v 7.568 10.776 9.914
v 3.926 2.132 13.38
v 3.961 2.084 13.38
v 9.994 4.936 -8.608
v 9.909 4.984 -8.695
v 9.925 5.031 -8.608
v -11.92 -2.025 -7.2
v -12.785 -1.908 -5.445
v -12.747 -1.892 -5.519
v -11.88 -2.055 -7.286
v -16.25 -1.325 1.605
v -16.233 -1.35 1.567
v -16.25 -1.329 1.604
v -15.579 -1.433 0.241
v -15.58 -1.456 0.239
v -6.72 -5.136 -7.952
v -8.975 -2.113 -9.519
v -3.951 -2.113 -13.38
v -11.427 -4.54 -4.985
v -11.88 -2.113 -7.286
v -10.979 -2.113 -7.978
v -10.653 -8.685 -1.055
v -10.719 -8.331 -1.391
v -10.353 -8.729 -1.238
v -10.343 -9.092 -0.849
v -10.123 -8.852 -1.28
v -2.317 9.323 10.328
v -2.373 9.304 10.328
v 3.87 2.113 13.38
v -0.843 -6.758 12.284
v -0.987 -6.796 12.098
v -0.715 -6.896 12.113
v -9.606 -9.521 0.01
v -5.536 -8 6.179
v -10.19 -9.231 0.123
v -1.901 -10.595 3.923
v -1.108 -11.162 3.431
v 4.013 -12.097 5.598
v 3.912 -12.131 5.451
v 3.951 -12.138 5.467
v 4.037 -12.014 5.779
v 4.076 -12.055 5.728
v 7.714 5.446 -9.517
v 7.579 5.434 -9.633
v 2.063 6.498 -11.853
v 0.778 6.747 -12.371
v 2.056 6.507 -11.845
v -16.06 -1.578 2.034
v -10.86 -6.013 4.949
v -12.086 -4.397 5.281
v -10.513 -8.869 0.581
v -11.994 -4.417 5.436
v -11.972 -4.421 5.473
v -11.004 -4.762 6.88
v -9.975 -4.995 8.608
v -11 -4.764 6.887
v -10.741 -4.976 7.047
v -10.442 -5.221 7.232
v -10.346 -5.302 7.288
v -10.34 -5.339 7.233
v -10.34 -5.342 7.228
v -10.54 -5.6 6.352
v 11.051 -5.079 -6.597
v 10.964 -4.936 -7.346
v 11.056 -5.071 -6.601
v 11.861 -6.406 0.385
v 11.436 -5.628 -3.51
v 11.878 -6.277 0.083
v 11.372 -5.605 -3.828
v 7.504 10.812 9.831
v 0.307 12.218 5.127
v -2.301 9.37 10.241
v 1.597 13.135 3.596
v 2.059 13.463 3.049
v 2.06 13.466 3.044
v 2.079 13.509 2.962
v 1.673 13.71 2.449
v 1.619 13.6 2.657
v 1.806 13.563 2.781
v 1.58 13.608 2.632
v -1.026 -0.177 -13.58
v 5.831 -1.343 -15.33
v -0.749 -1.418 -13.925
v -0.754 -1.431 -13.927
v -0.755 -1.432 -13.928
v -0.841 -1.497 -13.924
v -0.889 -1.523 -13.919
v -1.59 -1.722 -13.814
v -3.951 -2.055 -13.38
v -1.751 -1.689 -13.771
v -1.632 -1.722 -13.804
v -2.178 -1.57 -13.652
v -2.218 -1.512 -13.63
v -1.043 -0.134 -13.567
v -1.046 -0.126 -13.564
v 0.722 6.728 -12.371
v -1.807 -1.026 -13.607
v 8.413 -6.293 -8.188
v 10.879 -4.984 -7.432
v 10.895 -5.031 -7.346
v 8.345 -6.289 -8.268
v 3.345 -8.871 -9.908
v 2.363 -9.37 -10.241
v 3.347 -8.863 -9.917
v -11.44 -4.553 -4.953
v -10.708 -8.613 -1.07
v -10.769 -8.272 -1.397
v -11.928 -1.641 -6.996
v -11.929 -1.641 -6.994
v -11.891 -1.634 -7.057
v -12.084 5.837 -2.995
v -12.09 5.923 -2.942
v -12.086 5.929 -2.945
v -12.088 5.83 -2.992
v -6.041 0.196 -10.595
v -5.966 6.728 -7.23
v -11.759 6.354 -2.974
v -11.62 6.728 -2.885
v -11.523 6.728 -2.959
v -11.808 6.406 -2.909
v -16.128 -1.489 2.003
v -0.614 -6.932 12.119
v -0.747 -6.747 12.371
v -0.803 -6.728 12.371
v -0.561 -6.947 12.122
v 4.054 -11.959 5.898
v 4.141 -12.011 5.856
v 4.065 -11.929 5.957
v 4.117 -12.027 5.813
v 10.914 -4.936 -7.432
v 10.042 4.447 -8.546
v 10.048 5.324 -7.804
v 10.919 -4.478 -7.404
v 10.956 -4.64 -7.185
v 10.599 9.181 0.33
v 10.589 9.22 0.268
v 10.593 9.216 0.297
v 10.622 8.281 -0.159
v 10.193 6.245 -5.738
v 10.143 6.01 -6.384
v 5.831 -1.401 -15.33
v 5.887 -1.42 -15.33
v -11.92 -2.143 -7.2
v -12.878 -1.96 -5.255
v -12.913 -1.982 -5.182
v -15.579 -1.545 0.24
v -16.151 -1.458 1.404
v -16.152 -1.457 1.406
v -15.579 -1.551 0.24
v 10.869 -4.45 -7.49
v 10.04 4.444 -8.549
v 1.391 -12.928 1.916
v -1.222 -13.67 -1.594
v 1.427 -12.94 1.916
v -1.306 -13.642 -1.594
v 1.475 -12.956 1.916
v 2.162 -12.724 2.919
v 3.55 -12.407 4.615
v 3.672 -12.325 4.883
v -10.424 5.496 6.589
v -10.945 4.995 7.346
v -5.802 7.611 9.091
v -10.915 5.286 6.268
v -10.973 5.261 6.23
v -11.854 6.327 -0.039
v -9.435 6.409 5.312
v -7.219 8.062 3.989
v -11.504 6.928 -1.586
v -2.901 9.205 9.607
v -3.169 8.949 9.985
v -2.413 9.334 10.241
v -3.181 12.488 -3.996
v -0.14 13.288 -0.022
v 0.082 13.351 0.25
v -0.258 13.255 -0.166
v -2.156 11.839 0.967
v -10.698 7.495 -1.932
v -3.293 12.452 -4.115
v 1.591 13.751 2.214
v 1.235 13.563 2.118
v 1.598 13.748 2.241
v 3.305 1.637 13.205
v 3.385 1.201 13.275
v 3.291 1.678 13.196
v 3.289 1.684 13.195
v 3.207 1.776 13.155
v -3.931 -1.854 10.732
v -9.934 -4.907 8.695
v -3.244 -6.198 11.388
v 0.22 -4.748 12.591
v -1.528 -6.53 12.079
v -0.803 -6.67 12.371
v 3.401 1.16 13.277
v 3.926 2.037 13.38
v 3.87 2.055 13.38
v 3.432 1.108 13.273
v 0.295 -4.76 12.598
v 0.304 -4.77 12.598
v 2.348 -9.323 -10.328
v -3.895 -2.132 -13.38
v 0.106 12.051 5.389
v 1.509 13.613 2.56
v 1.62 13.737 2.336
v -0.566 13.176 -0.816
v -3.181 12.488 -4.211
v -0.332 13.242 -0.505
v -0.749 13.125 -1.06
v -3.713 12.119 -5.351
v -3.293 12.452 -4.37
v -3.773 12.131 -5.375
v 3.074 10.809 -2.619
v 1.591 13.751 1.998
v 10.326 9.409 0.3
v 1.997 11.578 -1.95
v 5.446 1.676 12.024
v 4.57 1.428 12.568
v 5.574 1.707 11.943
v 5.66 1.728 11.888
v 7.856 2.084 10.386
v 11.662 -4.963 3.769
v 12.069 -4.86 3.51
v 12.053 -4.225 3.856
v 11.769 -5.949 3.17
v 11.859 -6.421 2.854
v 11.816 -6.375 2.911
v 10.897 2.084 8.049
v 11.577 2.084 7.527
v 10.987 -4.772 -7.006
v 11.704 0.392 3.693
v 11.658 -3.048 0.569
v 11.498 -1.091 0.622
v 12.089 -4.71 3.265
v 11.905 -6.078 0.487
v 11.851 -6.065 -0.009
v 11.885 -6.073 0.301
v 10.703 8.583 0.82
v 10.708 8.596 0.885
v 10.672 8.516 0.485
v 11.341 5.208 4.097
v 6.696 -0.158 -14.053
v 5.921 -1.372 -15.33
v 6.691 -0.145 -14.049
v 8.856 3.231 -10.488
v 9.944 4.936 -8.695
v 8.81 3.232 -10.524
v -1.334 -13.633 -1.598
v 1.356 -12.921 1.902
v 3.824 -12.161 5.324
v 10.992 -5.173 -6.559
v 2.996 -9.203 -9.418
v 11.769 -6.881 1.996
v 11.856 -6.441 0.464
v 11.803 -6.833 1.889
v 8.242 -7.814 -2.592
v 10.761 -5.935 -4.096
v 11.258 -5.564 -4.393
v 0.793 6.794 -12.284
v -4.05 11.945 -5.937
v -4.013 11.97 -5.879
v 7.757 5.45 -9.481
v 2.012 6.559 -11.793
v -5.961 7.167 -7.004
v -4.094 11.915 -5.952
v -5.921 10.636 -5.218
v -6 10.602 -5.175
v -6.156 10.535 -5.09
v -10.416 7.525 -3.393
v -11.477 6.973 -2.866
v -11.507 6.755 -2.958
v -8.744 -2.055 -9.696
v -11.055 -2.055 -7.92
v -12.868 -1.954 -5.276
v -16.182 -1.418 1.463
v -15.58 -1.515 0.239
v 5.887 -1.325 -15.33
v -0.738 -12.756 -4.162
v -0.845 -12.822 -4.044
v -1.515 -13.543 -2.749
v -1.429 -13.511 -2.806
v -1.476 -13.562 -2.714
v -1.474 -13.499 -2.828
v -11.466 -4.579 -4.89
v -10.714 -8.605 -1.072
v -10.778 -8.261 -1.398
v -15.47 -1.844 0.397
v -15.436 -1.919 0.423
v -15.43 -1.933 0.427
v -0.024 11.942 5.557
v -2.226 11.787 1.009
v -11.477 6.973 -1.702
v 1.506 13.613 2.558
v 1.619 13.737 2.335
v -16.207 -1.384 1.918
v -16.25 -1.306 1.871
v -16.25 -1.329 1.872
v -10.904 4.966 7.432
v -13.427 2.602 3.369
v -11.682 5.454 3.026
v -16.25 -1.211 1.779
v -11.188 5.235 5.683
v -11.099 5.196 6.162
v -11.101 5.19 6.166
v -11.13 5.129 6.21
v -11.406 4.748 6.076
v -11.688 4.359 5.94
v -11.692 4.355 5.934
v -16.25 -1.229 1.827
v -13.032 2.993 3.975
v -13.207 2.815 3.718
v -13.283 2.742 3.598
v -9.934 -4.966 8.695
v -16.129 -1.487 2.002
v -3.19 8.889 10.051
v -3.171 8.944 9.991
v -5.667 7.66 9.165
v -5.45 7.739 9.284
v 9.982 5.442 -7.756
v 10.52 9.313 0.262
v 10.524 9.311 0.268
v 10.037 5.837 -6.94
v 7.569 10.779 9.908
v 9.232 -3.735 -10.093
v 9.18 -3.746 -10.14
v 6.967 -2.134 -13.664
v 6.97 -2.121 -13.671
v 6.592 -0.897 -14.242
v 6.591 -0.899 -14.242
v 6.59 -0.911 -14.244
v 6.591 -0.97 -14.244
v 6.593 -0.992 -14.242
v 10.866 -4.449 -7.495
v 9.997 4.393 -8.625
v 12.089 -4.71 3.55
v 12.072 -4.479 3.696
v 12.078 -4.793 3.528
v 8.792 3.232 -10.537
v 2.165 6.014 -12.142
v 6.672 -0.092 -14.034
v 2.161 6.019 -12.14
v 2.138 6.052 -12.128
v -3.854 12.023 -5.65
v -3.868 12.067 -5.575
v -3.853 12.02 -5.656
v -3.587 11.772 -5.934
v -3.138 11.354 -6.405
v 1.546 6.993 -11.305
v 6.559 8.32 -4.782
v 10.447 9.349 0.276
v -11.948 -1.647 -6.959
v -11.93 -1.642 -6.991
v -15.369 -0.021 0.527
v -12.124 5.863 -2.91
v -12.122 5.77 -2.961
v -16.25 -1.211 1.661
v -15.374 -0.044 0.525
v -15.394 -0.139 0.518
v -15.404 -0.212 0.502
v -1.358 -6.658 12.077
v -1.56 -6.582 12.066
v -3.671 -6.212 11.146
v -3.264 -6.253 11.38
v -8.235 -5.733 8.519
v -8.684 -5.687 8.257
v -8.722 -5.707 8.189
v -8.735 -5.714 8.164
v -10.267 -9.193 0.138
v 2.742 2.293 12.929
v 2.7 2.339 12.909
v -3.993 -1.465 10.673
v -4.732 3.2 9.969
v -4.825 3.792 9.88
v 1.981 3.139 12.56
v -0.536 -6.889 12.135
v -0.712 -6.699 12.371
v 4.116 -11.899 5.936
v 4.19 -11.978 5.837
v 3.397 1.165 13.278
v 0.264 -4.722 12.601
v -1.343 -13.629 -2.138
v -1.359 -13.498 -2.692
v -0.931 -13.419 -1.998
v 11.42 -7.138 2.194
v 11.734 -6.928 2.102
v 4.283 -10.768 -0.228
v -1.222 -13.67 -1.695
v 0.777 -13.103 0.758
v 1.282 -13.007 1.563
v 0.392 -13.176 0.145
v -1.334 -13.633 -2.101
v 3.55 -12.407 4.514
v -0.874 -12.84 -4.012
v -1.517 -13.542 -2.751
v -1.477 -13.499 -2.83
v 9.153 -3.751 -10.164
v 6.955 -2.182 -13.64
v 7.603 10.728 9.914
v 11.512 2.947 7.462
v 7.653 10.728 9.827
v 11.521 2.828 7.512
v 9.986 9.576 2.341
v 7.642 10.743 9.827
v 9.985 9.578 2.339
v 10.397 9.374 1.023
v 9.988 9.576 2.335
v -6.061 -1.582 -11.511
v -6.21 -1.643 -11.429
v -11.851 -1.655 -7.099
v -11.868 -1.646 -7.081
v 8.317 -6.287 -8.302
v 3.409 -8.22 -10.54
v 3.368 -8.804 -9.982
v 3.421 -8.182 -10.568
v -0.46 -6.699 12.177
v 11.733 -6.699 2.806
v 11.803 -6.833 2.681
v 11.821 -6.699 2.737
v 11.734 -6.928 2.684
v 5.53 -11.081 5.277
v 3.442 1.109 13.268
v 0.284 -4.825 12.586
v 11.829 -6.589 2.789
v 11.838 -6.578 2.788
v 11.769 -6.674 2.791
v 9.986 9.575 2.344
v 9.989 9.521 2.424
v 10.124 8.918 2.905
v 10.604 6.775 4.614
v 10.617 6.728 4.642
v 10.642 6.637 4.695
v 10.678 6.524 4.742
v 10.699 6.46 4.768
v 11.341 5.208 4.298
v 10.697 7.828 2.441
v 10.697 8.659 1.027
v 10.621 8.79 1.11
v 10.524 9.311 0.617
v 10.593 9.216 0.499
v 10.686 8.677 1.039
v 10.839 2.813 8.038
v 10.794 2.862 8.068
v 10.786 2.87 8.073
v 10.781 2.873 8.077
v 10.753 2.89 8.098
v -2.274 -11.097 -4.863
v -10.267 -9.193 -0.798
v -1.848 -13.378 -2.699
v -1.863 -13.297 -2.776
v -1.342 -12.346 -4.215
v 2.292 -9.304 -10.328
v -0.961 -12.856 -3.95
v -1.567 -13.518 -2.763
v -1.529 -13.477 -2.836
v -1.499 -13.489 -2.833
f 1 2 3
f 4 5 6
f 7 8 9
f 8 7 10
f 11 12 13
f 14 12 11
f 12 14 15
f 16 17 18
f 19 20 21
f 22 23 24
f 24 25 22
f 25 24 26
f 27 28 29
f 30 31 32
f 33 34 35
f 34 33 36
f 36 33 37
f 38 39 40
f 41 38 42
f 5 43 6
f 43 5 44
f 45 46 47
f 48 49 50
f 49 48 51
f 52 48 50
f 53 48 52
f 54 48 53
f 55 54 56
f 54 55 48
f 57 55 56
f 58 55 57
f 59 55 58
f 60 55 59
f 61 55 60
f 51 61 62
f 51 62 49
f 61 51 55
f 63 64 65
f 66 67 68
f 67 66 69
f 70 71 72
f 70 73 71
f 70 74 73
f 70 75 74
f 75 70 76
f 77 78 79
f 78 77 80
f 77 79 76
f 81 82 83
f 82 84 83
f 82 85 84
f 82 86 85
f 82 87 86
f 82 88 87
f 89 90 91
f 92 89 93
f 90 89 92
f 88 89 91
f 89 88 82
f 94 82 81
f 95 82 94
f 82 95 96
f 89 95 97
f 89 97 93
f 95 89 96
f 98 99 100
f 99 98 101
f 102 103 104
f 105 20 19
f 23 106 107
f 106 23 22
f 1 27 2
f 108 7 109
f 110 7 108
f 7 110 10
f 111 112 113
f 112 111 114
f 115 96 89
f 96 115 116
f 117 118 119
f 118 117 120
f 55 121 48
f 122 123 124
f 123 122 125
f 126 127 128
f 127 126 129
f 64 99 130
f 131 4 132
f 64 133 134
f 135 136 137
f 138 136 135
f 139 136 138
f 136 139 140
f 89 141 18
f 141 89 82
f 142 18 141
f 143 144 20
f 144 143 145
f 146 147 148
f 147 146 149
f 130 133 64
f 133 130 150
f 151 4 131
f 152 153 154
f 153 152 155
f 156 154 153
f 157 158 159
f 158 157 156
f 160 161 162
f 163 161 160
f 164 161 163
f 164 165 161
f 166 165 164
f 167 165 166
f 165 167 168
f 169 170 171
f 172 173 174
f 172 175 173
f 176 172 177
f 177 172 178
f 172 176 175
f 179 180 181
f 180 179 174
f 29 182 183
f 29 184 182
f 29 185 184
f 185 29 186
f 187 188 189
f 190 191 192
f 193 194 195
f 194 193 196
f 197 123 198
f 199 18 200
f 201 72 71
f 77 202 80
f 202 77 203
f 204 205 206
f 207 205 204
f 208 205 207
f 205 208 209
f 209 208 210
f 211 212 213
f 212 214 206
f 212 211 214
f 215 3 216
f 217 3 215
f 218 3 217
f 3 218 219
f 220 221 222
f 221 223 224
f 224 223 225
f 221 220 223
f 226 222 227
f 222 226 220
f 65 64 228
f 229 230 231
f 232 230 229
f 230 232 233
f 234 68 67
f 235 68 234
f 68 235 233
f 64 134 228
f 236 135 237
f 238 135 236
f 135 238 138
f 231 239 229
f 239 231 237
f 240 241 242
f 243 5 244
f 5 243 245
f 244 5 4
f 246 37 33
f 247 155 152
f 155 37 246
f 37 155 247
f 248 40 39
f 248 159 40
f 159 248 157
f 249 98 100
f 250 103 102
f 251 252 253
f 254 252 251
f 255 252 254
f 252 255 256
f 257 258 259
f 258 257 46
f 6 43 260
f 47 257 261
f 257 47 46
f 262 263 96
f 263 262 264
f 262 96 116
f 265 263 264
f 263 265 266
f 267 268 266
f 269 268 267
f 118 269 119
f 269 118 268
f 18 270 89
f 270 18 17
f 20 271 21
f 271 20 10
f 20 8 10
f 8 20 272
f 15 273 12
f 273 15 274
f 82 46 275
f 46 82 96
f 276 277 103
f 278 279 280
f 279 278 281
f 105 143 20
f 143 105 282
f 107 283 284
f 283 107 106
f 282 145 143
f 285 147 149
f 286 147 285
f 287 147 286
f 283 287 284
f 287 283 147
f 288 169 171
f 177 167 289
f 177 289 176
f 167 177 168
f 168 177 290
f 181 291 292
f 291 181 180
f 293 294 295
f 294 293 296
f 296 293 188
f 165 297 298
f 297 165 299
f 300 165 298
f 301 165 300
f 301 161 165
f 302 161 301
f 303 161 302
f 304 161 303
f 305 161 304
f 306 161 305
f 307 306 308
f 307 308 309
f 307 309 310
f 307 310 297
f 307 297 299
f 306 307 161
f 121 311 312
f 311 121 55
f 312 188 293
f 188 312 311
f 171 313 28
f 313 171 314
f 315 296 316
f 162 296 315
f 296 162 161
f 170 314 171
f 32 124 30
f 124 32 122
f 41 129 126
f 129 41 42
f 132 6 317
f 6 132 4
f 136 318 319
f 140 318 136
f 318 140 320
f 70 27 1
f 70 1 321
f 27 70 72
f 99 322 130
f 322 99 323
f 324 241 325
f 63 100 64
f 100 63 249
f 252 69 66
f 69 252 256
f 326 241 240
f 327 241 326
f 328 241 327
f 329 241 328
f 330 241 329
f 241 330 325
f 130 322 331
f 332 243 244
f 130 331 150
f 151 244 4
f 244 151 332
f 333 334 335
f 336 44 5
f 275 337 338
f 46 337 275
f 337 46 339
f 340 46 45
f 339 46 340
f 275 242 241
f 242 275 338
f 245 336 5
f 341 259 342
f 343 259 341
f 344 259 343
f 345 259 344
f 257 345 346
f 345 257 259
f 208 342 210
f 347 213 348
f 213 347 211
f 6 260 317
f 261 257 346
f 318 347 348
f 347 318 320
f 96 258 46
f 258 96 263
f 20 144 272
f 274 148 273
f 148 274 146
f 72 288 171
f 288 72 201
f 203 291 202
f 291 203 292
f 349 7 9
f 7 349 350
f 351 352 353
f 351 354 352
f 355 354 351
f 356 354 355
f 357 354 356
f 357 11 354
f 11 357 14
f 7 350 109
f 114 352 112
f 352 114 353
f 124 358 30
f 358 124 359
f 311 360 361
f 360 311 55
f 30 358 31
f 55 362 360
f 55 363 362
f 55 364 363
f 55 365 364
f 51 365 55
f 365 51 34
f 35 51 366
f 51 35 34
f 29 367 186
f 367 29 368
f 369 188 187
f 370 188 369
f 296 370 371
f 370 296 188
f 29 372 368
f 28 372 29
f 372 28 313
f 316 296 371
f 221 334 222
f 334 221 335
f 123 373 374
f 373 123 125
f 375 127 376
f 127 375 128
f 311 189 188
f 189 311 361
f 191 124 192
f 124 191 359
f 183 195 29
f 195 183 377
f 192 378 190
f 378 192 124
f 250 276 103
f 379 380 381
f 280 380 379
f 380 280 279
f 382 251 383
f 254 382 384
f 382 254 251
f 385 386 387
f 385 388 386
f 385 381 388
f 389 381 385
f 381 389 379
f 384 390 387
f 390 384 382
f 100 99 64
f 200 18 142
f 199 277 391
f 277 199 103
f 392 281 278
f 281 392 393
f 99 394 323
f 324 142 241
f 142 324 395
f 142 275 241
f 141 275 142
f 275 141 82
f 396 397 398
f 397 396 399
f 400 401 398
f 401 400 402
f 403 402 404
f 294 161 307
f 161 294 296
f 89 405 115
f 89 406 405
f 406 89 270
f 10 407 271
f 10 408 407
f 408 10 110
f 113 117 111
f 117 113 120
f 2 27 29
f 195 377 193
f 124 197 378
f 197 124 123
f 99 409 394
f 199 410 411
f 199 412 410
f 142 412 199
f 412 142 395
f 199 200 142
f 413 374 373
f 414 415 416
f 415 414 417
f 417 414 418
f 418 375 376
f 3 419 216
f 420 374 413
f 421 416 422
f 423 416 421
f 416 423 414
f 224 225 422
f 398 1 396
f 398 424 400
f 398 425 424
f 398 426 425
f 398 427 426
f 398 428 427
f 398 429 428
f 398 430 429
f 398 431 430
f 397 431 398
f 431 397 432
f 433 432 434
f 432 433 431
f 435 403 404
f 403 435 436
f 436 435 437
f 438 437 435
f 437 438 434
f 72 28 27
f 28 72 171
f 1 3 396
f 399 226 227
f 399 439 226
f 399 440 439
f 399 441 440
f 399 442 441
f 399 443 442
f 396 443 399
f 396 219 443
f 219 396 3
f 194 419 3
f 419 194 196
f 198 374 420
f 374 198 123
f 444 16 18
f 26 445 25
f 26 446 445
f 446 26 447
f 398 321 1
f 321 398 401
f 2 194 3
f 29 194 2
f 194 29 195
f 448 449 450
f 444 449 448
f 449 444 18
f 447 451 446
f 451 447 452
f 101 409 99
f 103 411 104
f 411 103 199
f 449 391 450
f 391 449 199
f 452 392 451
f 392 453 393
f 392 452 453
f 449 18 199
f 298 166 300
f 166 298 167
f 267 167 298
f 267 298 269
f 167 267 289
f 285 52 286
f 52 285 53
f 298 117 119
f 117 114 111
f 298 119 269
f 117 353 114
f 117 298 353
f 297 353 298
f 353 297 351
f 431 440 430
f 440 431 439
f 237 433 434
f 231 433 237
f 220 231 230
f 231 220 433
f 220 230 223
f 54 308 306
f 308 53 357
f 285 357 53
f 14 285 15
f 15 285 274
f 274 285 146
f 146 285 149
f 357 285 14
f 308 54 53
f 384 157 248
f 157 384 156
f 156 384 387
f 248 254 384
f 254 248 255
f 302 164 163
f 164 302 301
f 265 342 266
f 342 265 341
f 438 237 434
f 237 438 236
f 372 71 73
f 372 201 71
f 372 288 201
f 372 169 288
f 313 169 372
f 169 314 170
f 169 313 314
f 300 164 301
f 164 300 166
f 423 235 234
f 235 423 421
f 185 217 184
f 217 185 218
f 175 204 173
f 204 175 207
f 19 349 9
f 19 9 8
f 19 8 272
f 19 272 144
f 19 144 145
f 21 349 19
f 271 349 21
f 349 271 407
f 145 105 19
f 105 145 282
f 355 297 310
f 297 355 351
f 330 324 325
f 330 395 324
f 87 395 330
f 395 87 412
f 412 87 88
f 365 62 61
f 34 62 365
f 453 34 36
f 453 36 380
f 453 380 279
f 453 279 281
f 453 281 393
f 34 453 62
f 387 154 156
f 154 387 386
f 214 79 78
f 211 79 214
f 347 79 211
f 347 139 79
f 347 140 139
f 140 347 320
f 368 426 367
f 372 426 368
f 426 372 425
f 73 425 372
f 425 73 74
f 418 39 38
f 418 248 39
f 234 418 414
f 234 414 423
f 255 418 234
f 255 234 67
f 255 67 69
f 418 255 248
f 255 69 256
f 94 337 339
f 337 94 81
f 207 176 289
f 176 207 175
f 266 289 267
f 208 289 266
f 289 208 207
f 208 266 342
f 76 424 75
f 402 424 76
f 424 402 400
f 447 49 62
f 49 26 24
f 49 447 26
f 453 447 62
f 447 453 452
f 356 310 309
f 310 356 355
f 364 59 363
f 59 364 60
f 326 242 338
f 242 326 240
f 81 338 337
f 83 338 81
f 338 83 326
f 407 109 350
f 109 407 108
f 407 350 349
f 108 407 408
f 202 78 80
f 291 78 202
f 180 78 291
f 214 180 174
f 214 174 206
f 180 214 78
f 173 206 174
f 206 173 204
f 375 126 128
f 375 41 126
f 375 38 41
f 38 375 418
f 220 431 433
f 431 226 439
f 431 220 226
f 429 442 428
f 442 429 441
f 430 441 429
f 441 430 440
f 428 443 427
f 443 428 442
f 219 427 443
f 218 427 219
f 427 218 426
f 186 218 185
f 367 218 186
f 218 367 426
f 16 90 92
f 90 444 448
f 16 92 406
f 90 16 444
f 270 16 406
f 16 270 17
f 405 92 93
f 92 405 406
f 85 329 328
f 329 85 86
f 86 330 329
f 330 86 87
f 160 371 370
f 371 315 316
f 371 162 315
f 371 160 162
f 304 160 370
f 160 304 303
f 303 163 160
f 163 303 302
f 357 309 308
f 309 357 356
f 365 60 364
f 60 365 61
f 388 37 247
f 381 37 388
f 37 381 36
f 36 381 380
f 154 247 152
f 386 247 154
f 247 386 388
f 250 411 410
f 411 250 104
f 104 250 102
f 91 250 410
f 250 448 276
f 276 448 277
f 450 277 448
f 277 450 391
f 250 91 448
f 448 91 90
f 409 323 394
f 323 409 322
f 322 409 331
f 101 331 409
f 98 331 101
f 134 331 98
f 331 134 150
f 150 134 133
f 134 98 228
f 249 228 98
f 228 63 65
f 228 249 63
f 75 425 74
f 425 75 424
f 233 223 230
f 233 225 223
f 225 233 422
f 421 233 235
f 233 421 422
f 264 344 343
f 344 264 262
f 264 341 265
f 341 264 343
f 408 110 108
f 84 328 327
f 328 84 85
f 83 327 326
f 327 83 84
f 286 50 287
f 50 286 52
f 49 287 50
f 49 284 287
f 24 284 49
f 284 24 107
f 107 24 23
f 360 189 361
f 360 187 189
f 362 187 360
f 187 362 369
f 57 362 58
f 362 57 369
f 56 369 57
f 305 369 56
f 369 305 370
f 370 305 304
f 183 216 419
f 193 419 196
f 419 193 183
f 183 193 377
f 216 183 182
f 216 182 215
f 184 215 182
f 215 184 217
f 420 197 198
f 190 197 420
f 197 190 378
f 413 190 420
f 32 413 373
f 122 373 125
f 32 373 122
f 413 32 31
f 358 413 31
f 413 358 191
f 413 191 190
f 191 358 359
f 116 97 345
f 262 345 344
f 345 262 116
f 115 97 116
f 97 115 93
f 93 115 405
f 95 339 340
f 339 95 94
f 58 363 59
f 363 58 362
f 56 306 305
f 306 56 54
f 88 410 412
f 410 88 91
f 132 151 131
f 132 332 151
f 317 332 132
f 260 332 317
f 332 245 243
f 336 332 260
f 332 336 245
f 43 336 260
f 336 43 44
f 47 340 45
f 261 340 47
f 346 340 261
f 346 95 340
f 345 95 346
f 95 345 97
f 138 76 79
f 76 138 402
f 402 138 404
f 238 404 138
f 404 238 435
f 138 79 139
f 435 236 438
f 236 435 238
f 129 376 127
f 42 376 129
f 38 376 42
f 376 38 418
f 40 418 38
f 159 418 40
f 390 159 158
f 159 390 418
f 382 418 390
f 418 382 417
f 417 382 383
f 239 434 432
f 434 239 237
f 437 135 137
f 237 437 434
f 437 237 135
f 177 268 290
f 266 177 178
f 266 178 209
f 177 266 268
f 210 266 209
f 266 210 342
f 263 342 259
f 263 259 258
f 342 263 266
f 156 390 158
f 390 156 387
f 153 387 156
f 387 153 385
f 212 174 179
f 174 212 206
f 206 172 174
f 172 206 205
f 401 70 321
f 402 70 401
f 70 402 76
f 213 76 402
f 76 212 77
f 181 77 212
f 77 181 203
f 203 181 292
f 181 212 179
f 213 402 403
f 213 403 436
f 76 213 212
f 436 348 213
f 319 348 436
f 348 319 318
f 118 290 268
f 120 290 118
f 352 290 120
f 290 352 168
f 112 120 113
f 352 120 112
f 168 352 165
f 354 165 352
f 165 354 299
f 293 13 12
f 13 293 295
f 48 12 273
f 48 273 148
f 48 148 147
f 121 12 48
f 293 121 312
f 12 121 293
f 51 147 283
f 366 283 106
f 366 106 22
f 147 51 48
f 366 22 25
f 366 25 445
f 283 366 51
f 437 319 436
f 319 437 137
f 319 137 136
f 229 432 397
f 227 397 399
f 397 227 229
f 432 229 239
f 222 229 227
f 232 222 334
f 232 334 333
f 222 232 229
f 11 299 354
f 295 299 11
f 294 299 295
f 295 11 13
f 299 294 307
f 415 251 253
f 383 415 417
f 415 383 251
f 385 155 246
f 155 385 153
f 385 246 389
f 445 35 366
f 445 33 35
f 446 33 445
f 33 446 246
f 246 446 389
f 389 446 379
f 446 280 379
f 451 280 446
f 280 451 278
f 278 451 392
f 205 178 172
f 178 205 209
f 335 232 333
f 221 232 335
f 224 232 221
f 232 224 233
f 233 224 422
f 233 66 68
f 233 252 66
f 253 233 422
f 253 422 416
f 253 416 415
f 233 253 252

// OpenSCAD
// Auto-generated OpenSCAD file

    inner_points = 10*[[-0.12531678041950284, -1.3574519535518534, -0.3000260109199145], [-0.36746057341550314, 0.8957867730802842, 1.0108452987700864], [0.3981645779138779, -0.8876613539251546, -1.0108452987700864], [0.15602078491787758, 1.3655773727069829, 0.3000260109199145], [1.1703376344459069, -0.6833157024764185, 0.39628853077487575], [1.0778469356862532, 0.17734490632952513, 0.8969968161993667], [-1.0471429311878786, -0.16921948717439553, -0.8969968161993667], [-1.1396336299475323, 0.6914411216315481, -0.39628853077487575], [-0.2463928887078073, -0.7090848095102253, 1.1774700504213524], [1.1240990998859461, 0.520842947907666, -0.6834790050293927], [-1.0933950953875715, -0.5127175287525364, 0.6834790050293927], [0.277096893206182, 0.717210228665355, -1.1774700504213524], [0.3519124137141851, -1.2311593955032956, 0.5696305224586731], [0.20225931947783818, 0.16141872232289847, 1.379793546724183], [1.198923043974558, -0.47102223771210283, -0.5804992451419002], [1.0492699497382112, 0.9215558801140912, 0.2296637791236098], [-1.0185659452398366, -0.9134304609589615, -0.2296637791236098], [-1.1682190394761833, 0.4791476568672325, 0.5804992451419002], [-0.17155531497946344, -0.15329330316776887, -1.379793546724183], [-0.32120840921581034, 1.239284814658425, -0.5696305224586731], [0.7452968962209774, -0.6746243016514798, 1.3014210240601998], [-1.6168689194414103, -0.1269845502290076, -0.0762480675498447], [0.8250174408462159, -0.08256874217359109, -1.4226978450891705]];

    outer_points = 10*[[-0.4278051408840869, 1.2127161463312635, -0.5566217759152233], [-0.17380580954418245, -1.3719247336384077, -0.2261405699168037], [0.17380580954418245, 1.3719247336384077, 0.2261405699168037], [0.4278051408840869, -1.2127161463312635, 0.5566217759152233], [0.9893779464124436, 0.49362248371798856, -0.8608098595411191], [1.0863970578645408, -0.49362248371798856, -0.7345772714927785], [-1.0863970578645408, 0.49362248371798856, 0.7345772714927785], [-0.9893779464124436, -0.49362248371798856, 0.8608098595411191], [-0.3910812087944938, -0.20840674643547916, -1.3293410426713064], [1.1839567074308435, 0.20840674643547916, 0.7199573838305398], [-1.1839567074308435, -0.20840674643547916, -0.7199573838305398], [0.3910812087944938, 0.20840674643547916, 1.3293410426713064], [0.07624615997787965, 0.6698955034849399, -1.2283940854065145], [0.233226379865687, -0.9275004090487542, -1.0241454674564356], [1.0496731257749474, 0.9275004090487542, 0.038141995263304695], [1.2066533456627548, -0.6698955034849399, 0.24239061321338368], [-1.2066533456627548, 0.6698955034849399, -0.24239061321338368], [-1.0496731257749474, -0.9275004090487542, -0.038141995263304695], [-0.233226379865687, 0.9275004090487542, 1.0241454674564356], [-0.07624615997787965, -0.6698955034849399, 1.2283940854065145], [0.5871367924966472, -0.13720650167138226, -1.5243283937879823], [-1.624077516255638, -0.13720650167138226, 0.17515389348918065], [0.7552912676752325, 1.0728158516403192, 0.9827174256902117]];

    // Convex hull for inner set (I)
    module inner_hull() {
        hull() {
            for (p = inner_points) {
                translate(p) sphere(r=0.1);
            }
        }
    }

    // Convex hull for outer set (O) minus inner hull (O \ I)
    module outer_minus_inner() {
        difference() {
            hull() {
                for (p = outer_points) {
                    translate(p) sphere(r=0.1);
                }
            }
            inner_hull(); // Subtract inner hull
        }
    }

    // Convex hull for outer set (O) minus all translated inner hulls
    module outer_minus_AllTranslationInner() {
        difference() {
            hull() {
                for (p = outer_points) {
                    translate(p) sphere(r=0.1);
                }
            }
            hull() {
                translate([0,0,50]) inner_hull();
                translate([0,0,-50]) inner_hull();
            }; // Subtract translated inner hulls
        }
    }

    // Difference between outer_minus_inner and outer_minus_AllTranslationInner
    module outer_minus_inner_diff() {
        difference() {
            // Outer minus inner
            difference() {
                hull() {
                    for (p = outer_points) {
                        translate(p) sphere(r=0.1);
                    }
                }
                inner_hull();
            }

            // Subtract Outer minus AllTranslationInner
            difference() {
                hull() {
                    for (p = outer_points) {
                        translate(p) sphere(r=0.1);
                    }
                }
                hull() {
                    translate([0,0,50]) inner_hull();
                    translate([0,0,-50]) inner_hull();
                };
            }
        }
    }

    // Rendering all with colors applied
    color([1, 1, 0, 1]) outer_minus_inner_diff(); // Opaque yellow
    
